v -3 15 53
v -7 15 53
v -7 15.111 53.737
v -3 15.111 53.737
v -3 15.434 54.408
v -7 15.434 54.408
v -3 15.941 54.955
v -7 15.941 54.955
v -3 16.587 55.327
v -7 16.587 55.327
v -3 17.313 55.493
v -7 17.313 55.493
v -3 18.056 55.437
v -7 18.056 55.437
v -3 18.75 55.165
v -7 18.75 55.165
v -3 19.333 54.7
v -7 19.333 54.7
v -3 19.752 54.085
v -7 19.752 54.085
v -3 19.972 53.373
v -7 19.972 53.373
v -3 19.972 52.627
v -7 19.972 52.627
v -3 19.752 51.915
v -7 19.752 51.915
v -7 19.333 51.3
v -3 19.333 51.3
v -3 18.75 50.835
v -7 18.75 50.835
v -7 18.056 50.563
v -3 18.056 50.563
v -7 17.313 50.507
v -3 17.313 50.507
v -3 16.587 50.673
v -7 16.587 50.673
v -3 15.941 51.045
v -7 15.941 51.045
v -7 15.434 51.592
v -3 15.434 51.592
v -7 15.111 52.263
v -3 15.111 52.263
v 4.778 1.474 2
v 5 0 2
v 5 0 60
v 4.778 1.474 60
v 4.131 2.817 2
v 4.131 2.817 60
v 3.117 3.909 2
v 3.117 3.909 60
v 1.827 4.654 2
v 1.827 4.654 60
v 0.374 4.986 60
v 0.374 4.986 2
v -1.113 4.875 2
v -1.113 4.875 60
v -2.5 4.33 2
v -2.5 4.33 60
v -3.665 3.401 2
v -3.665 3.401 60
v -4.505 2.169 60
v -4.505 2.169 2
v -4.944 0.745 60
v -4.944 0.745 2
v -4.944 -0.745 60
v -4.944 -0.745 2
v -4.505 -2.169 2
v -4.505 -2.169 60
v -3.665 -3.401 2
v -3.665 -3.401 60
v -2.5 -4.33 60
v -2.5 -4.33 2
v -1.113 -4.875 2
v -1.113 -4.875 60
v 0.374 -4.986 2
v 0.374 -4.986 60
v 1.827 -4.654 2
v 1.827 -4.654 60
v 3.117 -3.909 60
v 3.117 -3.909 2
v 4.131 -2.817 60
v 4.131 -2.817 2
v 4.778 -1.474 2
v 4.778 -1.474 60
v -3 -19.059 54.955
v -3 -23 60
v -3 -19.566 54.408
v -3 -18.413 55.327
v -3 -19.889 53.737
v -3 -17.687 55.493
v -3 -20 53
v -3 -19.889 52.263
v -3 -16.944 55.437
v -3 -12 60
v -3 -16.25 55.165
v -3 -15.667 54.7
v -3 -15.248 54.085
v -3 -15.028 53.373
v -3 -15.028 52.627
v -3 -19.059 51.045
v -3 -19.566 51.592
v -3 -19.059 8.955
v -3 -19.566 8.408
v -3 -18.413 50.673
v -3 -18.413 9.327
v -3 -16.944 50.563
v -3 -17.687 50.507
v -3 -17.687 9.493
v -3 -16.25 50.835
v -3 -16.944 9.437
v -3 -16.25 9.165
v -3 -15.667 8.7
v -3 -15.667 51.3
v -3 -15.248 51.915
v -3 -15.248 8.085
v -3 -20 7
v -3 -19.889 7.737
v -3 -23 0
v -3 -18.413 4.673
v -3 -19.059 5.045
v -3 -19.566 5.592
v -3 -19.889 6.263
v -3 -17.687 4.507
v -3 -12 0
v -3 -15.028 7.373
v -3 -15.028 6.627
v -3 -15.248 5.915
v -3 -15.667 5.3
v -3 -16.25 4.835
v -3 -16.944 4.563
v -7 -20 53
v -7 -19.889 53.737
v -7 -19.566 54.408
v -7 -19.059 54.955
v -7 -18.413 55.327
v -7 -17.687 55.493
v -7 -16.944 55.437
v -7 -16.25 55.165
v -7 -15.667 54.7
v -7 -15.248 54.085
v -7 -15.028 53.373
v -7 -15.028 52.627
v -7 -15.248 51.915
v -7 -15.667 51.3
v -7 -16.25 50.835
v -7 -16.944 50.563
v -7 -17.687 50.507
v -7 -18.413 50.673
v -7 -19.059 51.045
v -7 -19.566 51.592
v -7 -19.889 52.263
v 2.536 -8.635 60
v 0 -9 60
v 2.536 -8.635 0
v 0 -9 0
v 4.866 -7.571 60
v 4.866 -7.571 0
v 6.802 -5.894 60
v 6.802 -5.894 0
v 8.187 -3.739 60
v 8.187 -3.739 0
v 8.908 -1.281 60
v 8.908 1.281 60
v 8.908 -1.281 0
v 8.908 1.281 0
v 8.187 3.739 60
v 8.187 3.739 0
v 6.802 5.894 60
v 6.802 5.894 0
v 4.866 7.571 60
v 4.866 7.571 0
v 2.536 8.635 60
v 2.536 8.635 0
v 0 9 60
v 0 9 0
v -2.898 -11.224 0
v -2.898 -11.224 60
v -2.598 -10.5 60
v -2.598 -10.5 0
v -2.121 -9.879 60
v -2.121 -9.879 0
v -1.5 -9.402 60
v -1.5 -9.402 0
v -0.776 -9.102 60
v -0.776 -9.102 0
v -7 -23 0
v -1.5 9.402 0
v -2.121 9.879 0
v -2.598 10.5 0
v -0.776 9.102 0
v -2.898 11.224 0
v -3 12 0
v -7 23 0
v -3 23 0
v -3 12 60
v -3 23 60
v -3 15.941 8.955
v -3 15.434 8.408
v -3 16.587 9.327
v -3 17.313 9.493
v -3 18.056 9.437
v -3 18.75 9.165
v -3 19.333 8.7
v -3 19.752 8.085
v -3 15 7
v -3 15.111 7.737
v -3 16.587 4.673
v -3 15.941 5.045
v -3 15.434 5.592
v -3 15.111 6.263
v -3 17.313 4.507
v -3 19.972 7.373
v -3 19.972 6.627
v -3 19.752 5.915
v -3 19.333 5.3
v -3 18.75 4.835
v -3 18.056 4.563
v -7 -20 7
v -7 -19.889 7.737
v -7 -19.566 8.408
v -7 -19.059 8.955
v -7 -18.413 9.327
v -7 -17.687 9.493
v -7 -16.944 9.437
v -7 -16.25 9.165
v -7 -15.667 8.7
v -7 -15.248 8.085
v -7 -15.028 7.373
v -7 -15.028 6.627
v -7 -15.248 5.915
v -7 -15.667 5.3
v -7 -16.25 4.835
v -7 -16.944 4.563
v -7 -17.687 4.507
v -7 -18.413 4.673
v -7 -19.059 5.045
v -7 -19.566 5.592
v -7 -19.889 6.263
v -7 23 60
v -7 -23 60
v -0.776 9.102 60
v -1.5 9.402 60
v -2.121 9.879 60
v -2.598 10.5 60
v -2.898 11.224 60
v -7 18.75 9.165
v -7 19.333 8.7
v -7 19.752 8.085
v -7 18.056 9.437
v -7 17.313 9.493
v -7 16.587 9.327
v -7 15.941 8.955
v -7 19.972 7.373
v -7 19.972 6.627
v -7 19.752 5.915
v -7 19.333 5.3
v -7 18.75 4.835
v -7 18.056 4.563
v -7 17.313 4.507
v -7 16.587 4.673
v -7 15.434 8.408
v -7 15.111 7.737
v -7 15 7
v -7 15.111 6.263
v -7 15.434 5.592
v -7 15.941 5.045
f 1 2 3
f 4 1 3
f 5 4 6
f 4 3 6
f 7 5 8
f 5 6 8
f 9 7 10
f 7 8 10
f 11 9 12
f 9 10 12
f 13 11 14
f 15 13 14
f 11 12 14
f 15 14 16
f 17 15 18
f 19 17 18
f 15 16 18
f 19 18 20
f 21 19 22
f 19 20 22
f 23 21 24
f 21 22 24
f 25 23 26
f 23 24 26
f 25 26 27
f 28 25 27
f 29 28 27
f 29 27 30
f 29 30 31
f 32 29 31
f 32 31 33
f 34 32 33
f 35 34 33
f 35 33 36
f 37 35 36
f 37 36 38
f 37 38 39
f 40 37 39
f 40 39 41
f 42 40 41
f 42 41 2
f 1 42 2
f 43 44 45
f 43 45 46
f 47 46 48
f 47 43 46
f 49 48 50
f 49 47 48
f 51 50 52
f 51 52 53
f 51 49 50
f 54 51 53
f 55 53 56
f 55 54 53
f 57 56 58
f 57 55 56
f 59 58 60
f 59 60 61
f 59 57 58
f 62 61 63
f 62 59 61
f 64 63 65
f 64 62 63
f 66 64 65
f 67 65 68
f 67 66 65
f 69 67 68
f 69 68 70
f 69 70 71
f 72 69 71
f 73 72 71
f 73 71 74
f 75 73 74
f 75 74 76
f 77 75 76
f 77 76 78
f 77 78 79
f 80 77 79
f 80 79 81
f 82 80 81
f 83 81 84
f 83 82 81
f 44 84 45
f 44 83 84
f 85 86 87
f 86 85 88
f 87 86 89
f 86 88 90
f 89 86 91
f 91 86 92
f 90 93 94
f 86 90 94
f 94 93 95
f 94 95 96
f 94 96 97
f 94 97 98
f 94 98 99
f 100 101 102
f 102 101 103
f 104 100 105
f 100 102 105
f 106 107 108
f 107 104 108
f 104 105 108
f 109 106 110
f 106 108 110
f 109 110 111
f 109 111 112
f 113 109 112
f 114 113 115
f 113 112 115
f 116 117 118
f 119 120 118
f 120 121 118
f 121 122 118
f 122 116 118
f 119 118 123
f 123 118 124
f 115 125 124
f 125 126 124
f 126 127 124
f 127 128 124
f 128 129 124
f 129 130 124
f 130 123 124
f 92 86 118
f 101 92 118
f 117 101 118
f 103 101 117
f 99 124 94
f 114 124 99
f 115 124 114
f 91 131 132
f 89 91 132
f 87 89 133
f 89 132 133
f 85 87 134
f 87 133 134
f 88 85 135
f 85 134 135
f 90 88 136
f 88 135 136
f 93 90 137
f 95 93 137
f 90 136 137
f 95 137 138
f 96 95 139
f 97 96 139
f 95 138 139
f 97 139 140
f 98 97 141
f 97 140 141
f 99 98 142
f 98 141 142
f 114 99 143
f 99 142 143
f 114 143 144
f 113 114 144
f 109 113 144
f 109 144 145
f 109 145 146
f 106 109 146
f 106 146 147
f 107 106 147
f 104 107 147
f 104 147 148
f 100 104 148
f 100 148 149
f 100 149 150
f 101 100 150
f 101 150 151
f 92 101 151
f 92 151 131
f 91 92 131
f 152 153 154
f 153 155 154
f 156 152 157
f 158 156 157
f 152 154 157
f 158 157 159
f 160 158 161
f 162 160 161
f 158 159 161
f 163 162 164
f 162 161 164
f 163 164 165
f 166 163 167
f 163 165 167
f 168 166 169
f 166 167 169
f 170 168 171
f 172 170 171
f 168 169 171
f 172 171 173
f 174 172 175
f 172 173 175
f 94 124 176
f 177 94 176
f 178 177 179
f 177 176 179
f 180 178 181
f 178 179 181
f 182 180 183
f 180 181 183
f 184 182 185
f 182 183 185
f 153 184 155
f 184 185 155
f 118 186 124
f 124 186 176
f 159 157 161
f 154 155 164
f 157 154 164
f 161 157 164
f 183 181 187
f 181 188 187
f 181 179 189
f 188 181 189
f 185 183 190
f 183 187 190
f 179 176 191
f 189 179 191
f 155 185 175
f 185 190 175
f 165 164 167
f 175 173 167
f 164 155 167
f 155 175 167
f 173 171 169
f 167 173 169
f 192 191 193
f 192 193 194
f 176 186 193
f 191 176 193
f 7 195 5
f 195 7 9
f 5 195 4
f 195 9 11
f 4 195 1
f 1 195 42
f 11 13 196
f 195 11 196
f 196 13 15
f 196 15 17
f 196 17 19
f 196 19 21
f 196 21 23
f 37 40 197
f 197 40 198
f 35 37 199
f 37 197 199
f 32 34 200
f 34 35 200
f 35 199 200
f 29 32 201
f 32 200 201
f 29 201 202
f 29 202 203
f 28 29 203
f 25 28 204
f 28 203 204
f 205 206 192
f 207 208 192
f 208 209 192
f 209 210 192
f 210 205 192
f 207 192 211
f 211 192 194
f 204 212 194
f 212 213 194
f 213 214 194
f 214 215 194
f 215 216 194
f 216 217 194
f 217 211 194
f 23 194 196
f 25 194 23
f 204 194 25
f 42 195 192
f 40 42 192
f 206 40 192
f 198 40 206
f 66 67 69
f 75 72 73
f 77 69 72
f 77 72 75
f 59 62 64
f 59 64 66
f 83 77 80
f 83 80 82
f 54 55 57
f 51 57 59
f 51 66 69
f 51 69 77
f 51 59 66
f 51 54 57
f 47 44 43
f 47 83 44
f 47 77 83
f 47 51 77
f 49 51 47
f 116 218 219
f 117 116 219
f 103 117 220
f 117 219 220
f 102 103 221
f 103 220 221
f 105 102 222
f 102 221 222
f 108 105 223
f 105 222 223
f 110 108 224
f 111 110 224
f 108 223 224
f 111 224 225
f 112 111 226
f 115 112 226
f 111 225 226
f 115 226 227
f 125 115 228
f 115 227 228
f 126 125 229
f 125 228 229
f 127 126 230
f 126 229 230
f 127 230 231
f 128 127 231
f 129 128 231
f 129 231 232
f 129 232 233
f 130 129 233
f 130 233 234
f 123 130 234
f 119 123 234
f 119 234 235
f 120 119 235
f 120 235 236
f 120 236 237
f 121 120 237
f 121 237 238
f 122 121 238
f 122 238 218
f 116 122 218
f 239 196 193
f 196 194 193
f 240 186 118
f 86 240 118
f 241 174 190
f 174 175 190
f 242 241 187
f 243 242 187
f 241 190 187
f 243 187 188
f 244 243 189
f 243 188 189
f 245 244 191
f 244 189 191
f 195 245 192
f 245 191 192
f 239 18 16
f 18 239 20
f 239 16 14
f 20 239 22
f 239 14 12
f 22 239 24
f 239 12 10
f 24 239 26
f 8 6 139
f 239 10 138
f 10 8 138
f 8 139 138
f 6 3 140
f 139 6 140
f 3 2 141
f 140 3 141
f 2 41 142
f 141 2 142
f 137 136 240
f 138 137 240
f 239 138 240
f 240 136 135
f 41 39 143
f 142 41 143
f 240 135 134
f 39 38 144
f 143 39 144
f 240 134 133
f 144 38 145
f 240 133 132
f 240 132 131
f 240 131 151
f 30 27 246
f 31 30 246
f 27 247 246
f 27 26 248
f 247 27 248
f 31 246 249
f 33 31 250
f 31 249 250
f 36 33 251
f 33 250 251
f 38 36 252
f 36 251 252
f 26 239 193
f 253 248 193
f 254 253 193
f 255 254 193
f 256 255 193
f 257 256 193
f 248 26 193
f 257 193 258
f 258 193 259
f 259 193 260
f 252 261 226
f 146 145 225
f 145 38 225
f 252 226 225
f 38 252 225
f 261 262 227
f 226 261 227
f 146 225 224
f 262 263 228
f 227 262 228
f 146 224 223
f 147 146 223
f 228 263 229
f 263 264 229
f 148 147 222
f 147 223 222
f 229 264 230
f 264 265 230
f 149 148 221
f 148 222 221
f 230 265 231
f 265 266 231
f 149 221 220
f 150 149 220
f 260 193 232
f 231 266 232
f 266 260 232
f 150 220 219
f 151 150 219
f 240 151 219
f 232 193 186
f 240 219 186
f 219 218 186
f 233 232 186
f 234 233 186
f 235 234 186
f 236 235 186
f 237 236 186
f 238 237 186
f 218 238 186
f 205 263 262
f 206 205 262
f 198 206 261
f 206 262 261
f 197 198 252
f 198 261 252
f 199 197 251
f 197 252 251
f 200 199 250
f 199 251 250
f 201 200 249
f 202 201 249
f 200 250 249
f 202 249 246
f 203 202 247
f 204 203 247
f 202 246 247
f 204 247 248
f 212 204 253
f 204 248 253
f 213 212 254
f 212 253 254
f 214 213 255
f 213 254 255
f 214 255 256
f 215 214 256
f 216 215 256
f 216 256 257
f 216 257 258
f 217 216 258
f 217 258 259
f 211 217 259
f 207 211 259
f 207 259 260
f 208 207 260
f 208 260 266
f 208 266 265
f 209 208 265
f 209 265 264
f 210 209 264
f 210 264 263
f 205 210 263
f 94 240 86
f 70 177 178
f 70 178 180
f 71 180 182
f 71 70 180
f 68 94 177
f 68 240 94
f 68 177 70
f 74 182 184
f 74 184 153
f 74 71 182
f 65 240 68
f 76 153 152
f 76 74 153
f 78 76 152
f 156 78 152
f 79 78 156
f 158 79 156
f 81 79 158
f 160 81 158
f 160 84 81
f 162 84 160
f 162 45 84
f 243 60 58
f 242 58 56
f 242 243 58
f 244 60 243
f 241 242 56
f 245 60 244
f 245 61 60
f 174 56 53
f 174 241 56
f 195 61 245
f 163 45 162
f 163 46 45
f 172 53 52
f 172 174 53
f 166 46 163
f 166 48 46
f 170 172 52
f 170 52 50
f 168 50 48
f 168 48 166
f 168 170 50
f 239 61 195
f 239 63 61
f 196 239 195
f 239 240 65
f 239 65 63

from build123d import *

# Parameters (mm, degrees)
F0_R     = 5
F1_DEPTH = 2
F2_R     = 5
F3_DEPTH = 58
F4_R     = 2.5
F5_DEPTH = 10


with BuildPart() as f1:
    # F0 (on Top) → F1 (new body)
    with BuildSketch(Plane.XY):
        with BuildLine():
            ThreePointArc((-3, -12), (-2.12132, -9.87868), (0, -9))
            ThreePointArc((0, -9), (9, 0), (0, 9))
            ThreePointArc((0, 9), (-2.12132, 9.87868), (-3, 12))
            Line((-3, 12), (-3, 23))
            Line((-3, 23), (-7, 23))
            Line((-7, 23), (-7, -23))
            Line((-7, -23), (-3, -23))
            Line((-3, -23), (-3, -12))
        make_face()
        Circle(F0_R, mode=Mode.SUBTRACT)
        Circle(F0_R)
    extrude(amount=F1_DEPTH)

    # F2 (on face) → F3 (join)
    with BuildSketch(Plane.XY.offset(2)):
        with BuildLine():
            ThreePointArc((-3, -12), (-2.12132, -9.87868), (0, -9))
            ThreePointArc((0, -9), (9, 0), (0, 9))
            ThreePointArc((0, 9), (-2.12132, 9.87868), (-3, 12))
            Line((-3, 12), (-3, 23))
            Line((-3, 23), (-7, 23))
            Line((-7, 23), (-7, -23))
            Line((-7, -23), (-3, -23))
            Line((-3, -23), (-3, -12))
        make_face()
        with Locations((0, 0)):
            Circle(F2_R, mode=Mode.SUBTRACT)
    extrude(amount=F3_DEPTH)

    # F4 (on face) → F5 (cut)
    with BuildSketch(Plane(origin=(-7, 0, 0), x_dir=(0, -1, 0), z_dir=(-1, 0, 0))):
        with Locations((-17.5, 53)):
            Circle(F4_R)
        with Locations((17.5, 7)):
            Circle(F4_R)
        with Locations((-17.5, 7)):
            Circle(F4_R)
        with Locations((17.5, 53)):
            Circle(F4_R)
    extrude(amount=-F5_DEPTH, mode=Mode.SUBTRACT)


solid = f1.part
